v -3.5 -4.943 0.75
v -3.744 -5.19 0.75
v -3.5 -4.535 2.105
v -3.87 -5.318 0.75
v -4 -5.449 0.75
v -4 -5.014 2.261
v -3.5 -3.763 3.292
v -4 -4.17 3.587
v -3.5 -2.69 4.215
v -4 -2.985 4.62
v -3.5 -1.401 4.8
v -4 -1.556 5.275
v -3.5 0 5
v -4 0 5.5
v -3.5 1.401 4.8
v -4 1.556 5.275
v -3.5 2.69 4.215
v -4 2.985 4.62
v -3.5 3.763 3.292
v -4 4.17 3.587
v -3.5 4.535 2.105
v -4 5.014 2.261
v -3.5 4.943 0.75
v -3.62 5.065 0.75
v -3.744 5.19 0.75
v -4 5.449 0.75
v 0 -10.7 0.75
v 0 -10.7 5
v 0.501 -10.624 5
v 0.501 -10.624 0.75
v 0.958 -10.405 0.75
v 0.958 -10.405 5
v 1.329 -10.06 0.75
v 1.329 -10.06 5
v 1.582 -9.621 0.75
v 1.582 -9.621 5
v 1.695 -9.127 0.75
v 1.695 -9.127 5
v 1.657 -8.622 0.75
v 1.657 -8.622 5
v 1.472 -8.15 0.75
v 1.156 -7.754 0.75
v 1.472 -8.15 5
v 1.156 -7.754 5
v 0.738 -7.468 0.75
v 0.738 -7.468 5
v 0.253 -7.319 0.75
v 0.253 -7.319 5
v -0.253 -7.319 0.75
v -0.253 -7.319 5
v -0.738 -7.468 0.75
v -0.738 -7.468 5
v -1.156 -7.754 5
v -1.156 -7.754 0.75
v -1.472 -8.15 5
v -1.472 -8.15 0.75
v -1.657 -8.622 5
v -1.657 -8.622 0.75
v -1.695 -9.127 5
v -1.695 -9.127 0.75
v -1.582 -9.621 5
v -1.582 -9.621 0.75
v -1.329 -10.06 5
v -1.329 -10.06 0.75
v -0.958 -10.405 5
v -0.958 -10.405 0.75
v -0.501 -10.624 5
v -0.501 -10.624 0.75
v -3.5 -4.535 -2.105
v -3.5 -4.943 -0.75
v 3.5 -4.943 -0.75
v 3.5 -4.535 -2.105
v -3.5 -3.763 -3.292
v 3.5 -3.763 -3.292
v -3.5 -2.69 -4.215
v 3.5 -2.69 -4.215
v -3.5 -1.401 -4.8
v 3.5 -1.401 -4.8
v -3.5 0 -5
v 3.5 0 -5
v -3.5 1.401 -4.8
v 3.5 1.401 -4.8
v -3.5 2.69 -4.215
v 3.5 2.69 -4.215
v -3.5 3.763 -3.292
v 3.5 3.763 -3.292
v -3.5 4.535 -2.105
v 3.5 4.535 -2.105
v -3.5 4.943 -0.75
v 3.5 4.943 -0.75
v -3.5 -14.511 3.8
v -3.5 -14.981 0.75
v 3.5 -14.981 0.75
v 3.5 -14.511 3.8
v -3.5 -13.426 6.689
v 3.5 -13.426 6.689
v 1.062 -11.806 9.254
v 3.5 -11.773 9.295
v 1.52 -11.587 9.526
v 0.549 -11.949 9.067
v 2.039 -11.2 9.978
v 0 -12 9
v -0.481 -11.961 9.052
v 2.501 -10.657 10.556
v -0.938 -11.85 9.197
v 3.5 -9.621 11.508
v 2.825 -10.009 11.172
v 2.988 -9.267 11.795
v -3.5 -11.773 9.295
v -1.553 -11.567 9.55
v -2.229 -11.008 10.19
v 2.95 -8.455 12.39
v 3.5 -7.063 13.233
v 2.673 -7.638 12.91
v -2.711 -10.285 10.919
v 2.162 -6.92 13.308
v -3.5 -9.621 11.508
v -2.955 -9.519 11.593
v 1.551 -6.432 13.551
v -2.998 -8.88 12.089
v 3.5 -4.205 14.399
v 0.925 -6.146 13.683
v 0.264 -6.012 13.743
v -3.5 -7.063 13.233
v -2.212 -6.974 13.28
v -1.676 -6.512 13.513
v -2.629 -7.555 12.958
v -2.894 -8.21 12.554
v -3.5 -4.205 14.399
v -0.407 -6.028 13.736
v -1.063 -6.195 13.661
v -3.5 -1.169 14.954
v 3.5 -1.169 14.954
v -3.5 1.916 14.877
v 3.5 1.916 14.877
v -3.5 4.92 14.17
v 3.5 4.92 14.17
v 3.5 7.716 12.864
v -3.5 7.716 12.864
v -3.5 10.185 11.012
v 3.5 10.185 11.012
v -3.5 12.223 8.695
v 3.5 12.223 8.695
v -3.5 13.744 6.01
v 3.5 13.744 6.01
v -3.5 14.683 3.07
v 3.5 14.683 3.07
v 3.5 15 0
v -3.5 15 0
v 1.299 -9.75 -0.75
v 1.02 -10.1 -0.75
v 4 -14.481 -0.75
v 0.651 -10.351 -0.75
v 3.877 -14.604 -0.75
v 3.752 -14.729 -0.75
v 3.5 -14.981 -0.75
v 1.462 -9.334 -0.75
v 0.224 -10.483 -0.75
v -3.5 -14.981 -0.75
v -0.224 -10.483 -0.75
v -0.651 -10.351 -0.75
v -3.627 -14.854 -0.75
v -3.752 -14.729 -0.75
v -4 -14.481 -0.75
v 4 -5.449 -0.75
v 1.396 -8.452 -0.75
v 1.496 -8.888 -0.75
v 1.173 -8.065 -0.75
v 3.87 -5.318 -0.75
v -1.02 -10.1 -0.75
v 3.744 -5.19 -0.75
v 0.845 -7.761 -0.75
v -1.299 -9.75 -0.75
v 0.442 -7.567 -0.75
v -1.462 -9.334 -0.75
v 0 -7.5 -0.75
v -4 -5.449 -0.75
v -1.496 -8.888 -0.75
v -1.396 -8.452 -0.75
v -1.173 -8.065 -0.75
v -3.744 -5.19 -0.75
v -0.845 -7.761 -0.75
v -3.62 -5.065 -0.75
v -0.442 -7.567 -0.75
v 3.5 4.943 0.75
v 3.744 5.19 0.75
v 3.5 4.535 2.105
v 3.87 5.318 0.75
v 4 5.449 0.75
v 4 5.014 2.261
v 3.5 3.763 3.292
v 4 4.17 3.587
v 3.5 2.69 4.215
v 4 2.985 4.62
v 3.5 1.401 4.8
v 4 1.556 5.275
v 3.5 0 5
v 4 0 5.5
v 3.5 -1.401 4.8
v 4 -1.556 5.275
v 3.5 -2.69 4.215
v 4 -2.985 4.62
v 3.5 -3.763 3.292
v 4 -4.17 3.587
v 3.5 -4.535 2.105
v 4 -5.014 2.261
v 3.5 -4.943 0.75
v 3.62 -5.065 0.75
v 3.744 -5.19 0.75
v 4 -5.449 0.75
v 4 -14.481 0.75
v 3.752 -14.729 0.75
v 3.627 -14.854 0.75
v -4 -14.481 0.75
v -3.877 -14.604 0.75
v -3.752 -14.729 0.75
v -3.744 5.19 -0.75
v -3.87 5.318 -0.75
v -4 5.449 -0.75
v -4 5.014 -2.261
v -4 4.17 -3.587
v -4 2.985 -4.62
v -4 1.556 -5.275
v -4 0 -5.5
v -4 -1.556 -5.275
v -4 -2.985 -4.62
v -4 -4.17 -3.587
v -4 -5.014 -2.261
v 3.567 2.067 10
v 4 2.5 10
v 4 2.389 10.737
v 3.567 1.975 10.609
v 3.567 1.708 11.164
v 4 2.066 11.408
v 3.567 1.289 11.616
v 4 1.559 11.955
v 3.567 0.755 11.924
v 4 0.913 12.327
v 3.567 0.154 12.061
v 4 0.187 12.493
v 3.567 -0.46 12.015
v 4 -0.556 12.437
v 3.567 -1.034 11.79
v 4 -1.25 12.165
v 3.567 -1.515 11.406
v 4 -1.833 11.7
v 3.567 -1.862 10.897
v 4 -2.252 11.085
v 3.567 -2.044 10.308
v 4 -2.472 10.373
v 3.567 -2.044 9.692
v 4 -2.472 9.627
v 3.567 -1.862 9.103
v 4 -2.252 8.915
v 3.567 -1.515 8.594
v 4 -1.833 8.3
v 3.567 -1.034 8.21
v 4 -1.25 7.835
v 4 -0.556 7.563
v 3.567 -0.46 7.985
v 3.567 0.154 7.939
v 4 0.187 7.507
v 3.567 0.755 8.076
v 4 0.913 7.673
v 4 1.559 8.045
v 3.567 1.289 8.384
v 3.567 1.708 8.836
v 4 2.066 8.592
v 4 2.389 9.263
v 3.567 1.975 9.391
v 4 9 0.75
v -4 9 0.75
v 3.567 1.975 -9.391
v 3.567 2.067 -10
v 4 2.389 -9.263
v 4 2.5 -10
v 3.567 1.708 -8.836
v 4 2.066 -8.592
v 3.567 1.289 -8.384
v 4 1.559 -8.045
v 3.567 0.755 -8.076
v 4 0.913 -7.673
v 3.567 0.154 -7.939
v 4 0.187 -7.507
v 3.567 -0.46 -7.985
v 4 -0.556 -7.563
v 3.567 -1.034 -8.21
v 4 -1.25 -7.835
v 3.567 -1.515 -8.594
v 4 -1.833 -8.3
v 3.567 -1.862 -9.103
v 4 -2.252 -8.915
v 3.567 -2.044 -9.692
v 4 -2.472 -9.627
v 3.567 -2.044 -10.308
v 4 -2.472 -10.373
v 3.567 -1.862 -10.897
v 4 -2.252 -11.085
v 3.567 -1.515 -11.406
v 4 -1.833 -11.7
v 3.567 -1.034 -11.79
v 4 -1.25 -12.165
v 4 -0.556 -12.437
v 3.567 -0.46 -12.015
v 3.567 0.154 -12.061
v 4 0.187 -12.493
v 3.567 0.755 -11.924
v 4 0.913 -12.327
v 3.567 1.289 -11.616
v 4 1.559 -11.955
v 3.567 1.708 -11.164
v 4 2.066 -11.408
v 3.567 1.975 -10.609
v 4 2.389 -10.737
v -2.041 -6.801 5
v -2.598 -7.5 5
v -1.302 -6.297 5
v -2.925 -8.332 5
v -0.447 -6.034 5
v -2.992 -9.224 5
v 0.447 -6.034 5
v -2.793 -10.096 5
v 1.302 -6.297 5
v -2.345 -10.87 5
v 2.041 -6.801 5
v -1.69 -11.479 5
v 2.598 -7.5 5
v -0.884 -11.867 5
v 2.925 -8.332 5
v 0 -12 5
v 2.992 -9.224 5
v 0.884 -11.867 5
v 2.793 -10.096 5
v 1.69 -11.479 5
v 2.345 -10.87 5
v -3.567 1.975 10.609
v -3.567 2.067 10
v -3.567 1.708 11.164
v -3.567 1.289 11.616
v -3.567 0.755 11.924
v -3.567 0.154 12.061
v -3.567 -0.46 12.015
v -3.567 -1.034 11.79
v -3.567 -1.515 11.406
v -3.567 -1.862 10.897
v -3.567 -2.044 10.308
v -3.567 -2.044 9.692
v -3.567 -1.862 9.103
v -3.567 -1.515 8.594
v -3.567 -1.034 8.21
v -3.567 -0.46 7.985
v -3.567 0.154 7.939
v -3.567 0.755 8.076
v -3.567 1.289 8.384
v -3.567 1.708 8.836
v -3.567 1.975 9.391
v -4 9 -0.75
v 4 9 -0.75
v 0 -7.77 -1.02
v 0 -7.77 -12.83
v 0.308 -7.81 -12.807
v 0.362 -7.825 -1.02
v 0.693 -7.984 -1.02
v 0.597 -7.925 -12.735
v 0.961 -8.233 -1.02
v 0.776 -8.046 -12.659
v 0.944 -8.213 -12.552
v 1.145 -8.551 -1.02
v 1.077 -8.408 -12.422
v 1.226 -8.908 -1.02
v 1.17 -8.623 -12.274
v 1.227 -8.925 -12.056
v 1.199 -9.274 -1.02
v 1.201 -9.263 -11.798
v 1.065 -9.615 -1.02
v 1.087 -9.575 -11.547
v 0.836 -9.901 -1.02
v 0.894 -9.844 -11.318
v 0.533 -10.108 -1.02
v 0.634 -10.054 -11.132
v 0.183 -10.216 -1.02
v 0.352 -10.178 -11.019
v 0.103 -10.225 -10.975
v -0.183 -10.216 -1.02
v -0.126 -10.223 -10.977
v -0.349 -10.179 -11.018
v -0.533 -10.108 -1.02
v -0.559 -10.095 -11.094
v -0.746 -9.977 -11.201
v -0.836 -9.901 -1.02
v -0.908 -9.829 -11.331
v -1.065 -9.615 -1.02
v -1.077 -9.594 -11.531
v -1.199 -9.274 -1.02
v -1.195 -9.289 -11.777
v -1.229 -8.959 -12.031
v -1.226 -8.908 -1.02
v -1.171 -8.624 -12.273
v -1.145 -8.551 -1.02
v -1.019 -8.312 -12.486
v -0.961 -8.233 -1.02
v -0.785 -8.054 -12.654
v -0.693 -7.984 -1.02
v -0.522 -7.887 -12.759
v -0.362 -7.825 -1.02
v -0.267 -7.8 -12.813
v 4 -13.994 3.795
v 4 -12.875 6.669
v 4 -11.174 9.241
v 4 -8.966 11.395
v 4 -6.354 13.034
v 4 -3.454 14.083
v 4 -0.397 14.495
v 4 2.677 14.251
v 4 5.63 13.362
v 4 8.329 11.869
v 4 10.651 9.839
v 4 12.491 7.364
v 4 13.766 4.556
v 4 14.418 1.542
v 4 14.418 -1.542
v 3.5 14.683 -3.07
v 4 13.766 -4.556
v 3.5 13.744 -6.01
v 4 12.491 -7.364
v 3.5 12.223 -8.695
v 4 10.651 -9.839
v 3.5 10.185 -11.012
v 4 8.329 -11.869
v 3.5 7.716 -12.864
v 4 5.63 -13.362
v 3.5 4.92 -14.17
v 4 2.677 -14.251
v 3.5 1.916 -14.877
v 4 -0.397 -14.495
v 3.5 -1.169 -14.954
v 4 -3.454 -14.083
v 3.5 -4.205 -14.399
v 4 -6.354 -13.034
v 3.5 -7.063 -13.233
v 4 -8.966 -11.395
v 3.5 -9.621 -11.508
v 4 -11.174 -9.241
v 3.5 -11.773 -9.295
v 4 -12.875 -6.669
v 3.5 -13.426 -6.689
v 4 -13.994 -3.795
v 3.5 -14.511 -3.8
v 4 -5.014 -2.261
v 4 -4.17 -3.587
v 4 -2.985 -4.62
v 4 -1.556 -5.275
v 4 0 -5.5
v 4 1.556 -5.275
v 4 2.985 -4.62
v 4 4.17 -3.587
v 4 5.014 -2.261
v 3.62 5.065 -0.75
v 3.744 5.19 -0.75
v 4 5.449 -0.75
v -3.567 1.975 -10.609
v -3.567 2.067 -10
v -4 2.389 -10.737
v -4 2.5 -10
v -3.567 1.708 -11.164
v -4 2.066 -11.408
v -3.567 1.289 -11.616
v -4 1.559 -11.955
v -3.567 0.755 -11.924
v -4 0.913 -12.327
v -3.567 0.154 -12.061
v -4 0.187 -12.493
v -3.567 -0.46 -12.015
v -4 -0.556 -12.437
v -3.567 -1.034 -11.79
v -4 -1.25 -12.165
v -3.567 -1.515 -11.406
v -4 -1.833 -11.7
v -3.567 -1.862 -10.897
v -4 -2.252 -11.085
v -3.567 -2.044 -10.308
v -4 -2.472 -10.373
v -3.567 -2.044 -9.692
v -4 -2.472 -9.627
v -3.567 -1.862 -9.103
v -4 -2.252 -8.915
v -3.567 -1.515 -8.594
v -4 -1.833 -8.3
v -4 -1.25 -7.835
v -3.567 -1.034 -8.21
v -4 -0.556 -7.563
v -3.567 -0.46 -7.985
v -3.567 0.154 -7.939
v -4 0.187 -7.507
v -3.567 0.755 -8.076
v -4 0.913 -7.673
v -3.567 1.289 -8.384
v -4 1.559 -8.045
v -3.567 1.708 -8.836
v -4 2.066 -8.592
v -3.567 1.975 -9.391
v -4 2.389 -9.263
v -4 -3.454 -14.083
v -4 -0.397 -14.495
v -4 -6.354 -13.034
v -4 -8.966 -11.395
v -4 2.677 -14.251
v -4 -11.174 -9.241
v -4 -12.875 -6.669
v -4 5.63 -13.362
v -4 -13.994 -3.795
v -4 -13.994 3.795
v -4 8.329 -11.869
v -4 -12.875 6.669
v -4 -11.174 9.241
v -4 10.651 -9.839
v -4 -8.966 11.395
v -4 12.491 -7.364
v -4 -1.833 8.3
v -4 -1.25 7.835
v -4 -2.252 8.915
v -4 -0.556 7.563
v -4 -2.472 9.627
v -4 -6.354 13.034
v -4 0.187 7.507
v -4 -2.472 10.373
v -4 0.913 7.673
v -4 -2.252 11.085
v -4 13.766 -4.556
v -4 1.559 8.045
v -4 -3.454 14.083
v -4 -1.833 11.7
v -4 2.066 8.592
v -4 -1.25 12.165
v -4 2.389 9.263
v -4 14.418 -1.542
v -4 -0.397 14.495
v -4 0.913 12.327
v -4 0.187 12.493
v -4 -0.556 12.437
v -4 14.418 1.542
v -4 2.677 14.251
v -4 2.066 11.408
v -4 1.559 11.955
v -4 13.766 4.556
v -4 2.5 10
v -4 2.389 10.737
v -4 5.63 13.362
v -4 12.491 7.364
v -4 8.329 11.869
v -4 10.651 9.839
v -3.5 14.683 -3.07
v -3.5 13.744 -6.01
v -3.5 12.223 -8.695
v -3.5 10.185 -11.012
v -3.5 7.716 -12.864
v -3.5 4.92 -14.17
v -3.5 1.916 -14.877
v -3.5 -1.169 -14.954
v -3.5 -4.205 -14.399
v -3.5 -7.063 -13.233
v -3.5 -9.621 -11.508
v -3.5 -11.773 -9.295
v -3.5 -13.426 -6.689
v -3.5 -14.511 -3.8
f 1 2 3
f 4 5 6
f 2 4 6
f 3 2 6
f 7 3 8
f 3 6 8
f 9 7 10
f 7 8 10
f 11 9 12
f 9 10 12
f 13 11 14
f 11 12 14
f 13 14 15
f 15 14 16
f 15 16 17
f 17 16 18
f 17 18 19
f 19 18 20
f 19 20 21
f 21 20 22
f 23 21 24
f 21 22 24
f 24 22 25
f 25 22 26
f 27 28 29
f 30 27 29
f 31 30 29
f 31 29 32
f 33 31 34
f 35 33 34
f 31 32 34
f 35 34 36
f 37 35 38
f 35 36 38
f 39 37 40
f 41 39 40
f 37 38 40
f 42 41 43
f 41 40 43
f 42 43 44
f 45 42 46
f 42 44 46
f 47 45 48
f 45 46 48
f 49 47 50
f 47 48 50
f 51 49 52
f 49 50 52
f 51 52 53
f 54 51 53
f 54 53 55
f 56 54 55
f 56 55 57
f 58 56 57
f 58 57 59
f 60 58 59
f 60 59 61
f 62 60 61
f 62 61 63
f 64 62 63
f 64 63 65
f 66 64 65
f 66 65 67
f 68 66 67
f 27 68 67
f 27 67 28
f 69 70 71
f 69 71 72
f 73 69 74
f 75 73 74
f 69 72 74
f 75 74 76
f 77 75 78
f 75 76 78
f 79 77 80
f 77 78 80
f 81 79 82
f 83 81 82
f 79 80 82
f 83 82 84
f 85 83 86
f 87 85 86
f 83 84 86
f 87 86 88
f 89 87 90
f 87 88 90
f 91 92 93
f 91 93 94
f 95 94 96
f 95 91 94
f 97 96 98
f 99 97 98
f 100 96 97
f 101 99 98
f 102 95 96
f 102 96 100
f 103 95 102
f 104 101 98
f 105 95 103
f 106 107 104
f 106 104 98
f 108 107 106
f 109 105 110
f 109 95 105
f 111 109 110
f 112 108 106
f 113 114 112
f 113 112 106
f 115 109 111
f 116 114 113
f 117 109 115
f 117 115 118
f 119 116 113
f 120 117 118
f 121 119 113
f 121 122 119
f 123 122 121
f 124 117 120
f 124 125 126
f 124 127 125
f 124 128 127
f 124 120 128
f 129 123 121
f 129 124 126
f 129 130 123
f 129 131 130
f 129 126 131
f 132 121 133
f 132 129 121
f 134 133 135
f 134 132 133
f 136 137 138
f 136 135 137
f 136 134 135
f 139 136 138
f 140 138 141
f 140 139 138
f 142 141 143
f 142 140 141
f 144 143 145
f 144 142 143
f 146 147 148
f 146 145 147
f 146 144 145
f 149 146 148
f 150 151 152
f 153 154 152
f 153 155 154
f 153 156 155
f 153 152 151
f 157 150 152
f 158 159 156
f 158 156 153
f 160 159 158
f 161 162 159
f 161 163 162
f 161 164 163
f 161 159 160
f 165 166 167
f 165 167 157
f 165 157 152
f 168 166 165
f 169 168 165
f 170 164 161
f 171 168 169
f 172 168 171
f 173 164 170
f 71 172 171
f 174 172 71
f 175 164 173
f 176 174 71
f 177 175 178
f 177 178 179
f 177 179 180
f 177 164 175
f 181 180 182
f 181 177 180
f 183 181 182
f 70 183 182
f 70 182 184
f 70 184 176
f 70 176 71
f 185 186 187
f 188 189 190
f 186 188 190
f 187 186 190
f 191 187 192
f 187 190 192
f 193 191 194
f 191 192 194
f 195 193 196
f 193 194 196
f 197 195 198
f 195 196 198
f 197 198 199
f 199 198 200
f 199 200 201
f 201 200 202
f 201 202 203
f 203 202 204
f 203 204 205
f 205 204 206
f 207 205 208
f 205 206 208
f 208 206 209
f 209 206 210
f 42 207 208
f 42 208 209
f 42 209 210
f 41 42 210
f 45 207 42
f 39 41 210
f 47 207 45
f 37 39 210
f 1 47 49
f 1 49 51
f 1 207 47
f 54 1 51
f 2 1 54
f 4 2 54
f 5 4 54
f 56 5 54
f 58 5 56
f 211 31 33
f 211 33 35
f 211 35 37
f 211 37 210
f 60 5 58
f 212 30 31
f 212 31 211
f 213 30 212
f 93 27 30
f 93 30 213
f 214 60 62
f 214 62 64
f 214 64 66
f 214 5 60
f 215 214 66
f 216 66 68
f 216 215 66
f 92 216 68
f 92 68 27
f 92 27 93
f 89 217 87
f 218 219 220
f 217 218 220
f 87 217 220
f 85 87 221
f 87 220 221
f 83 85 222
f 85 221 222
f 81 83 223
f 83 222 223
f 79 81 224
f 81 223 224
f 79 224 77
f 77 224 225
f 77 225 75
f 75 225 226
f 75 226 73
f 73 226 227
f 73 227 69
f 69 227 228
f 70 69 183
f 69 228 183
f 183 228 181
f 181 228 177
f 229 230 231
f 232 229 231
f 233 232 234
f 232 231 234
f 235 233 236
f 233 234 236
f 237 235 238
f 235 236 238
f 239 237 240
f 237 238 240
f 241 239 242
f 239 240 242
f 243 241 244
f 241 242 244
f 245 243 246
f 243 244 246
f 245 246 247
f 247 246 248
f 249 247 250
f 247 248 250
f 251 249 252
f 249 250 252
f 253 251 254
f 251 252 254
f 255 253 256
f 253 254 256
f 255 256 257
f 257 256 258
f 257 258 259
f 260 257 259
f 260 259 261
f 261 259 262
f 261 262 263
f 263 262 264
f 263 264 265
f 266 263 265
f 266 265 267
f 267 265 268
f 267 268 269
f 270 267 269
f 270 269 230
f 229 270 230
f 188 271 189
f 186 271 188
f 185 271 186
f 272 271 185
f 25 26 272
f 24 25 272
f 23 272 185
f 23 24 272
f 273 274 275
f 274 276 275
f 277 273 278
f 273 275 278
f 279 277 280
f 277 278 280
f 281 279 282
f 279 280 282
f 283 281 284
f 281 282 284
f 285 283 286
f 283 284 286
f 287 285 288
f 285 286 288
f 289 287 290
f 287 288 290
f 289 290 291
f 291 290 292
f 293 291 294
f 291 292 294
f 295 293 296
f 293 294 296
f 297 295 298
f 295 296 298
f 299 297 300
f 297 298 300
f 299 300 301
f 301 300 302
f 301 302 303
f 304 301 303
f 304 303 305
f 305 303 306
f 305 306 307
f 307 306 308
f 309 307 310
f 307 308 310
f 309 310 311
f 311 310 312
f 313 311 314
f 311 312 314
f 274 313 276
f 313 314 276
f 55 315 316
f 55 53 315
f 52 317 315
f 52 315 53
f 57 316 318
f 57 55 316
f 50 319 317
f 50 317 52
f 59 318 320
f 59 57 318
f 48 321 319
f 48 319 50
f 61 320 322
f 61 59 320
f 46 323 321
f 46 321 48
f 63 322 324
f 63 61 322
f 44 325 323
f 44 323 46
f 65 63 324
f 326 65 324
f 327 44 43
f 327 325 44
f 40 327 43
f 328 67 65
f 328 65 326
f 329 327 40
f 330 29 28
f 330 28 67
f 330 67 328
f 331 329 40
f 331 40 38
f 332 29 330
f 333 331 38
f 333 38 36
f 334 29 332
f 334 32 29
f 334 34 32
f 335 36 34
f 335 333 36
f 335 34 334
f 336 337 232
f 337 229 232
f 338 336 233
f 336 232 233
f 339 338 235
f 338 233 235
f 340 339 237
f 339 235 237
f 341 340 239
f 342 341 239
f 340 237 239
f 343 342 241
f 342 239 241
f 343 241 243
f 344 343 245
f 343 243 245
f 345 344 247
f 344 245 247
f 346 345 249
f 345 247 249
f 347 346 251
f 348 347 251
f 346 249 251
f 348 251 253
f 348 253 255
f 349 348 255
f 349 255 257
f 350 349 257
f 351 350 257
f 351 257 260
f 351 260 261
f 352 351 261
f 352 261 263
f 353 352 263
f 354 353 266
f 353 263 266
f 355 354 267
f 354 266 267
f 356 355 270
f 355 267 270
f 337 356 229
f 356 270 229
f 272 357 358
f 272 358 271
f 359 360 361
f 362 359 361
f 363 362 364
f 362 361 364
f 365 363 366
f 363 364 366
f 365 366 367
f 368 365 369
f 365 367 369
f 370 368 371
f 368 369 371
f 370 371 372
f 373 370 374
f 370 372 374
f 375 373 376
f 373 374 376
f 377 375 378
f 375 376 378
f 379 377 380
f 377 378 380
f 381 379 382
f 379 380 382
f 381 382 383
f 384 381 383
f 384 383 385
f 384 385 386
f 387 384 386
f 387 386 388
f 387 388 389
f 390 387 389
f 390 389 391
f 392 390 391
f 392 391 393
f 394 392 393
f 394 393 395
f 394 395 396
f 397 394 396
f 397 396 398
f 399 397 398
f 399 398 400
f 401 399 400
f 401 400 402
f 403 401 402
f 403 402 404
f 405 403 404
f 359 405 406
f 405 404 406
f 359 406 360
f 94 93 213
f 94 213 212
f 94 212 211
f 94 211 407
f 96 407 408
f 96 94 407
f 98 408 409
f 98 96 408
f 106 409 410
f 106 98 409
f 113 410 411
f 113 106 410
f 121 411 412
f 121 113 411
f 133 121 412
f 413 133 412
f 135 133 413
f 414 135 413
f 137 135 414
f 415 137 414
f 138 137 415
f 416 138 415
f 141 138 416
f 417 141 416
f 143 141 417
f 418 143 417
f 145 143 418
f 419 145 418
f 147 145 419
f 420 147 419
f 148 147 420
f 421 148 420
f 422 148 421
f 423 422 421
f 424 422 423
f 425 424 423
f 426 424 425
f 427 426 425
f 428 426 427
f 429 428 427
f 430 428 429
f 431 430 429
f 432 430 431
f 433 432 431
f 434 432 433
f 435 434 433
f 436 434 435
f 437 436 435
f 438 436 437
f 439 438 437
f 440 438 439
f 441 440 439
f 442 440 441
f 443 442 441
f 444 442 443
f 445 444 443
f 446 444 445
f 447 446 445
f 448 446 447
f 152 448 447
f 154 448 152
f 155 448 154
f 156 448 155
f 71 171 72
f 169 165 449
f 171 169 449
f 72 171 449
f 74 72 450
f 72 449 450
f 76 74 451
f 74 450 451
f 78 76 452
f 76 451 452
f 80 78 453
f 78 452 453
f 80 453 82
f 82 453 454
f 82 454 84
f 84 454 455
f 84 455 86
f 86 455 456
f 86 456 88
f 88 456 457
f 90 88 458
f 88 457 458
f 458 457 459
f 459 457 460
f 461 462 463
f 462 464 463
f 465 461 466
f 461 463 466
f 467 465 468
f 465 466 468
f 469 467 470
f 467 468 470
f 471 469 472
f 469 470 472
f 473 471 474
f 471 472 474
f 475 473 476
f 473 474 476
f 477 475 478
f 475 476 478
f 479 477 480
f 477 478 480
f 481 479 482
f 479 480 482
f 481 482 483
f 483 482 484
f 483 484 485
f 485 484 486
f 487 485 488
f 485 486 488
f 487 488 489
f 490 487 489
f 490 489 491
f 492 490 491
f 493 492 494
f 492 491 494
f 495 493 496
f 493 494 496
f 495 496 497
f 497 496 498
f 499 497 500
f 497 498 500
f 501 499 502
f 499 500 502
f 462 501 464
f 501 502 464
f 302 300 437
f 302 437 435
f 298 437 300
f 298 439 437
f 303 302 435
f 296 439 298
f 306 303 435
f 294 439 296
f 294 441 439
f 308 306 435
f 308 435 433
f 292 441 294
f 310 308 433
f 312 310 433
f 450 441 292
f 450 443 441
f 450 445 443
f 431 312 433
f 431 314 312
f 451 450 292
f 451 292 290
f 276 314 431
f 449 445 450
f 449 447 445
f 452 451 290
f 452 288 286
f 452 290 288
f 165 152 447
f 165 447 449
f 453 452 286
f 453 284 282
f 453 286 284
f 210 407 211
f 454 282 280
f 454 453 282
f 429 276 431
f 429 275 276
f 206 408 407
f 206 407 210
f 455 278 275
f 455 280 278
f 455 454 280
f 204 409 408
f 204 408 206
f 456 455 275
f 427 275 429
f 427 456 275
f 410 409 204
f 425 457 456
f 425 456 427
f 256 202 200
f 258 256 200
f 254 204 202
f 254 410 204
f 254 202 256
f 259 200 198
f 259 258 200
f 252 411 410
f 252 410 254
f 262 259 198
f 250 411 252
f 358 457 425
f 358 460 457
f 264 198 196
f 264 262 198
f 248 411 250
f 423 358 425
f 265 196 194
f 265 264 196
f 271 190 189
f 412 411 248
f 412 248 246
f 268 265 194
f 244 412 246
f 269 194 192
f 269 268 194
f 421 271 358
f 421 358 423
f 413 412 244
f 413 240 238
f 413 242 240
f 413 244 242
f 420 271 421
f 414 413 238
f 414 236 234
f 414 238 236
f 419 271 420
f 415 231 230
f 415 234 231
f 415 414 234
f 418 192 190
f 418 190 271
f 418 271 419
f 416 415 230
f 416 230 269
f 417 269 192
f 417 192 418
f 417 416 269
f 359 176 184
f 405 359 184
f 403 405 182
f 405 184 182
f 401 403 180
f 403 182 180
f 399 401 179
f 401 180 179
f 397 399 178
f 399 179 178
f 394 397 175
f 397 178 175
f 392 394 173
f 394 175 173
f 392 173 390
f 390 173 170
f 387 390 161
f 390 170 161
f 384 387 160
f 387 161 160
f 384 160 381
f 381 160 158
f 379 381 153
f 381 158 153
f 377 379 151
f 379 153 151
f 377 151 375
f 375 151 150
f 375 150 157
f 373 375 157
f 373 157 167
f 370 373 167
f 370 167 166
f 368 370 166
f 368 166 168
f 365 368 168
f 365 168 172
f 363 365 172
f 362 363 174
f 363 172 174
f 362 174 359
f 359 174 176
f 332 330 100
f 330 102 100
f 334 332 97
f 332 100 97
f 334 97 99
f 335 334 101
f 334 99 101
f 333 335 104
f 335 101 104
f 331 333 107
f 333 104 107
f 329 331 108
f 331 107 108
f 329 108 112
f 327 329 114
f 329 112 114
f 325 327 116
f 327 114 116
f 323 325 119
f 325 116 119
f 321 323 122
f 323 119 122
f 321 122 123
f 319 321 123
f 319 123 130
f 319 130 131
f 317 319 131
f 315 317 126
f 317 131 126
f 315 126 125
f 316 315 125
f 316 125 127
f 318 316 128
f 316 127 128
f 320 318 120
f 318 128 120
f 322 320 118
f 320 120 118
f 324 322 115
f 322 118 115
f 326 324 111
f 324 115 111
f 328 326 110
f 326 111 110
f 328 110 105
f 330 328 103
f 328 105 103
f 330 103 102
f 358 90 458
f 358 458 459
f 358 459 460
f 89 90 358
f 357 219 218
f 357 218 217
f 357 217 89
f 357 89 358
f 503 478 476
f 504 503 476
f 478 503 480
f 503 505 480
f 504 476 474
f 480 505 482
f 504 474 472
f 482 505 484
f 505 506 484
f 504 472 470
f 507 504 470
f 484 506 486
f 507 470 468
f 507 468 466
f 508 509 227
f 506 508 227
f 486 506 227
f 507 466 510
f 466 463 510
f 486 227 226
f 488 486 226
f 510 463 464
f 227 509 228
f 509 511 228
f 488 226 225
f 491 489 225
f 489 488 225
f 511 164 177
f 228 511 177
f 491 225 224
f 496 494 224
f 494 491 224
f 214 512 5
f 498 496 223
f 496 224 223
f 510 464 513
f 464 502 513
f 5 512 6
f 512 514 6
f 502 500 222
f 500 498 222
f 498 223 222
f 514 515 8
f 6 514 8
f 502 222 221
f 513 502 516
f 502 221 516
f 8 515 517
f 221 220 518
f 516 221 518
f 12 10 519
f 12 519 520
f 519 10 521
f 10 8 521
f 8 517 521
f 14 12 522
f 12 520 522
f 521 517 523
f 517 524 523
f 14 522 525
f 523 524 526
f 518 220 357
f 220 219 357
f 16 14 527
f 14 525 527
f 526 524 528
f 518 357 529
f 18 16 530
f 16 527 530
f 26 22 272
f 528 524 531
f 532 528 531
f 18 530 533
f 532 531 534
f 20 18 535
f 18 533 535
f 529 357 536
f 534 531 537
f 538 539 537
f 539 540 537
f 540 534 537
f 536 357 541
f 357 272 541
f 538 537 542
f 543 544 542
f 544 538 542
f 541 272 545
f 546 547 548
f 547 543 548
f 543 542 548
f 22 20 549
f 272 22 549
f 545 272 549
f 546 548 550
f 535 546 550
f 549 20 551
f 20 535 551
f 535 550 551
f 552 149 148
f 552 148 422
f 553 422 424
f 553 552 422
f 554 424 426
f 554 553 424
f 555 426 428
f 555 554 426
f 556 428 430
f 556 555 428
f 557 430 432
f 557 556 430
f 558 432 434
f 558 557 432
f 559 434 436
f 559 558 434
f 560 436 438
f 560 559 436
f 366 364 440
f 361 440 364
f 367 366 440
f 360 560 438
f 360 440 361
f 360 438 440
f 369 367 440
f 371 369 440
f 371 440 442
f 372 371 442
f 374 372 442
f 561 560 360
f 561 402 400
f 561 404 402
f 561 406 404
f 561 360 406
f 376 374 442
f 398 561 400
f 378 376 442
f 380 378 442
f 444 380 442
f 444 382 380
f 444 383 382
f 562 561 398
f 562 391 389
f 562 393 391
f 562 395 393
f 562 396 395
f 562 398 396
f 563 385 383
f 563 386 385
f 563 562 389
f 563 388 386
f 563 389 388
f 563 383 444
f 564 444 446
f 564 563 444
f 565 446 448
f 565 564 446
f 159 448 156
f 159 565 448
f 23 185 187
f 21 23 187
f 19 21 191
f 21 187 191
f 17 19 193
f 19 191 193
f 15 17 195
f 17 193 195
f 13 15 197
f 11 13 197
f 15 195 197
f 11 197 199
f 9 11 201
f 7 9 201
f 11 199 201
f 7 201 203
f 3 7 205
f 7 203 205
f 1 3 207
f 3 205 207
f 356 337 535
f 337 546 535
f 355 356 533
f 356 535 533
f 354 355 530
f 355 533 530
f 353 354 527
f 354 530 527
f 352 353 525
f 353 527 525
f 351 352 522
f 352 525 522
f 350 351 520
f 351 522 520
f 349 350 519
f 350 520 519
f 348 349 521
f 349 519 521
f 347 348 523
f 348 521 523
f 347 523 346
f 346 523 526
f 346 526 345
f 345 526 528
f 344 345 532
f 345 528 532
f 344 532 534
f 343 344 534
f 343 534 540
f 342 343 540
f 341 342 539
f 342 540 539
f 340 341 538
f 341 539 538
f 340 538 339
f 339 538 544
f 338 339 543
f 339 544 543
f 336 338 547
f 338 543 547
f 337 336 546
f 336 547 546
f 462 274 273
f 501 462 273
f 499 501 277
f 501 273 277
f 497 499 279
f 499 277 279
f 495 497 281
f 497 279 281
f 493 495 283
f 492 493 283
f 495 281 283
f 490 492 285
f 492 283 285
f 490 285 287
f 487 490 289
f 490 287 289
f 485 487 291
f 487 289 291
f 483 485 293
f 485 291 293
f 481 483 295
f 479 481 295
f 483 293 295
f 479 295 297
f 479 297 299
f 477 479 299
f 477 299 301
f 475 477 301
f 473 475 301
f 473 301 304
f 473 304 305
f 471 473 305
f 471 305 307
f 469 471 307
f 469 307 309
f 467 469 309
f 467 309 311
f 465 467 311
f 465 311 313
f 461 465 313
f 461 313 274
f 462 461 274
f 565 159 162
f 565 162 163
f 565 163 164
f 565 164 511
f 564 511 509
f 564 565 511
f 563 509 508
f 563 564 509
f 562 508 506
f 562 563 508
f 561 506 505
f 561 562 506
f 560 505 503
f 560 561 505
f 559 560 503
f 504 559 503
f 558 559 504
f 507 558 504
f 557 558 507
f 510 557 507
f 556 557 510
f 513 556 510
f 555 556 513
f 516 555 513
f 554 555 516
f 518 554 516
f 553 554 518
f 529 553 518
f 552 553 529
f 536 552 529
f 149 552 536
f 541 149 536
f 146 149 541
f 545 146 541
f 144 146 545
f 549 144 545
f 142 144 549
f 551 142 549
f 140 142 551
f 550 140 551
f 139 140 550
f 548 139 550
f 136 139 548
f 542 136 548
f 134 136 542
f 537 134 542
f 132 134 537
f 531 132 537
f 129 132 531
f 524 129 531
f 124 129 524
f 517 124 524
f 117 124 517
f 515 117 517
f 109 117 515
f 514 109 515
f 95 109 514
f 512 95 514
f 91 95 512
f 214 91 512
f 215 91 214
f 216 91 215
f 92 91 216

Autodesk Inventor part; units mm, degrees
sketch "Sketch_1" plane through (0, 0, 0) normal (0, 0, 1) x (1, 0, 0)
  line L0 (4, 0) -> (-4, 0)
  line L1 (-4, 14.5) -> (-4, 5.5)
  line L2 (-4, 5.5) -> (-3.5, 5)
  line L3 (-3.5, 5) -> (3.5, 5)
  line L4 (3.5, 5) -> (4, 5.5)
  line L5 (4, 5.5) -> (4, 14.5)
  line L6 (4, 14.5) -> (3.5, 15)
  line L7 (3.5, 15) -> (-3.5, 15)
  line L8 (-3.5, 15) -> (-4, 14.5)
revolve "Revolution1" add sketch "Sketch_1" angle 360 about axis through (4, 0, 0) along (1, 0, 0)
sketch "Sketch_2" plane through (0, 0, 0) normal (1, 0, 0) x (0, 1, 0)
  line L0 (-15, 0.75) -> (-15, -0.75)
  line L1 (-15, -0.75) -> (9, -0.75)
  line L2 (9, -0.75) -> (9, 0.75)
  line L3 (9, 0.75) -> (-15, 0.75)
extrude "Extrusion1" cut sketch "Sketch_2" along normal mid plane 8
sketch "Sketch_3" plane through (0, 0, 0) normal (1, 0, 0) x (0, 1, 0)
  line L0 (-9, 15) -> (-9, 0)
  line L1 (-9, 0) -> (-10.7, 0)
  line L2 (-10.7, 0) -> (-10.7, 5)
  line L3 (-10.7, 5) -> (-12, 5)
  line L4 (-12, 5) -> (-12, 15)
  line L5 (-12, 15) -> (-9, 15)
  line L6 (-9, 15) -> (-9, 0)
revolve "Revolution2" cut sketch "Sketch_3" angle 360 about axis through (0, -9, 15) along (0, 0, 1)
sketch "Sketch_4" plane through (0, 0, 0) normal (1, 0, 0) x (0, 1, 0)
  line L0 (-9, -14.25) -> (-9, -0.75)
  line L1 (-9, -0.75) -> (-7.5, -0.75)
  line L2 (-7.5, -0.75) -> (-7.7705, -1.0205)
  line L3 (-7.7705, -1.0205) -> (-7.7705, -14.25)
  line L4 (-7.7705, -14.25) -> (-9, -14.25)
  line L5 (-9, -14.25) -> (-9, -0.75)
revolve "Revolution3" cut sketch "Sketch_4" angle 360 about axis through (0, -9, -14.25) along (0, 0, -1)
thread "Thread1" size "M3x0.5" class "6H" standard "ISO Metric profile" length 11.9699
sketch "Sketch_7" plane through (0, 0, -10) normal (0, 0, 1) x (1, 0, 0)
  line L0 (4, 0) -> (-4, 0)
  line L1 (-4, 0) -> (-4, 2.5)
  line L2 (-4, 2.5) -> (-3.567, 2.067)
  line L3 (-3.567, 2.067) -> (3.567, 2.067)
  line L4 (3.567, 2.067) -> (4, 2.5)
  line L5 (4, 2.5) -> (4, 0)
  line L6 (4, 0) -> (-4, 0)
revolve "Revolution4" cut sketch "Sketch_7" angle 360 about axis through (4, 0, -10) along (1, 0, 0)
thread "Thread2" size "M5x0.8" class "6H" standard "ISO Metric profile" full length
sketch "Sketch_8" plane through (0, 0, 10) normal (0, 0, 1) x (1, 0, 0)
  line L0 (4, 0) -> (-4, 0)
  line L1 (-4, 0) -> (-4, 2.5)
  line L2 (-4, 2.5) -> (-3.567, 2.067)
  line L3 (-3.567, 2.067) -> (3.567, 2.067)
  line L4 (3.567, 2.067) -> (4, 2.5)
  line L5 (4, 2.5) -> (4, 0)
  line L6 (4, 0) -> (-4, 0)
revolve "Revolution5" cut sketch "Sketch_8" angle 360 about axis through (4, 0, 10) along (1, 0, 0)
thread "Thread3" size "M5x0.8" class "6H" standard "ISO Metric profile" full length
ref_plane "body_screw_XY" through (0, -9, 5) normal (0, 0, 1) x (1, 0, 0)
ref_plane "body_screw_YZ" through (0, -9, 5) normal (1, 0, 0) x (0, 1, 0)
ref_plane "body_screw_ZX" through (0, -9, 5) normal (0, 1, 0) x (0, 0, 1)
properties part number "SSCSW10-8b" material "鉄、鋳鉄"
